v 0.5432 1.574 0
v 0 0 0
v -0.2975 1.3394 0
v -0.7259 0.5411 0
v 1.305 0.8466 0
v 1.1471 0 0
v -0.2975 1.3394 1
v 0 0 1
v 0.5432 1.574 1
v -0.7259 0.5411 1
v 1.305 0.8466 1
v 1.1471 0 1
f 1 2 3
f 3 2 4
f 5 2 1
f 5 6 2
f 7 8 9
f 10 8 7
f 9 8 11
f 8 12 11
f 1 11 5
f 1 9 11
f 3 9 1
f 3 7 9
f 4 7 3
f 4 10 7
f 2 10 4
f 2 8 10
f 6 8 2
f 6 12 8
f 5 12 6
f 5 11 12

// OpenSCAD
//  kit wallace random polygon
// number of sides 
n=6;
// average length of side
side=1;
// % randomness in length of side
length_random_pc=20;
// % randomness in interior angle
angle_random_pc=20;
// height of extrusion
height=1;
// tolerance to rounding errors
eps=0.0;

//  angles 

function angle_between(u, v) = 
     let (x= unitv(u) * unitv(v))
     let (y = x <= -1 ? -1 :x >= 1 ? 1 : x)
     let (a = acos(y))
     let (d = cross(u,v).z)
      d  > 0 ? a : 360- a;
               
// vector operations 
function zero(v) =
    len(v) == undef ? 0 : [for (i=[0:len(v)-1]) 0];
   
function slice(v,d,i=0) =
     i < len(v) ?  concat([v[i][d]], slice(v,d,i+1) ) : [] ;
   
function unitv(v)=  v/ norm(v);
   
function v_sum_r(v,n,k) =
      k < n ?  v[k] + v_sum_r(v,n,k+1) : zero(v[0]) ;

function v_sum(v) = v_sum_r(v,len(v),0);
  
function avg(v) =v_sum(v) / len(v);
    
function v_centre(v) =  avg(v);
  
function 3d_to_2d(points)=
    [ for (p=points) [p.x,p.y]];
        
function 2d_to_3d(points)=
    [ for (p=points) [p.x,p.y,0]];

//  perimeter operations   
//  perimeter is  defined as a sequence of length/interior angle pairs, going anticlockwise 

function peri_to_points(peri,pos=[0,0,0],dir=0,i=0) =
    i == len(peri)
      ? [pos]
      : let(side = peri[i])
        let (distance = side[0])
        let (newpos = pos + distance* [cos(dir), sin(dir),0])
        let (angle = side[1])
        let (newdir = dir + (180 - angle))
        concat([pos],peri_to_points(peri,newpos,newdir,i+1)) 
     ;  
        
function peri_to_tile(peri,last=false) = 
    let (p = peri_to_points(peri))  
    last 
       ? [for (i=[0:len(p)-1]) p[i]] 
       : [for (i=[0:len(p)-2]) p[i]]; 

function total_internal(peri) =
      v_sum(slice(peri,1));
       
function isPolygon(peri) =
       let (n = len(peri))
       abs(total_internal(peri) - (n - 2) * 180)<  0.01;
       
function isConvex(peri,i=0) =
   i < len(peri)
     ? peri[i][1] > 0  && peri[i][1] < 180  && peri[i][0] > 0 && isConvex(peri,i+1)
     : true;     
       
// tile operations
    
function tile_to_peri(points) =
    [for (i=[0:len(points)-1])
        let (a = angle_between(
          points[(i+1) % len(points)] - points[i],
          points[(i+2) % len(points)] -  points[(i+1) % len(points)]))
          
       [norm(points[(i+1) % len(points)] - points[i]),
       180-a
       ]
    ] ;
    
// tile to object    
module fill_tile(tile,color="red") {
    color(color)
       polygon(3d_to_2d(tile)); 
};

function random_peri(n,side,lp,ap) =
   let(rs = rands(-1,1,2*n))
   let(lr= side * lp/100 )
   let(angle = 180 - 360 /n)
   let(ar = angle * ap/100)
   let (p1 =
    [for (i=[0:n-2])
        [max(side + rs[i]*lr,0), 
         max(angle + rs[i+n]*ar,0)]
    ])
   let(p2 = tile_to_peri(peri_to_tile(p1,true)))  // close the polygon
   let(ln= p2[n-1][0])
   let(an= p2[n-1][1])
   let(an1= p2[n-2][1])
   isConvex(p2) &&
   isPolygon(p2) &&
       abs (ln - side) < lr + eps  
       && abs (an - angle) < ar + eps  
       && abs (an1 - angle) < ar + eps  
       ? p2
       : random_peri(n,side,lp,ap)
  ;

// main
     
peri = random_peri(n=n,side=side,lp=length_random_pc,ap=angle_random_pc);
echo(peri);
tile= peri_to_tile(peri);
linear_extrude(height=height) fill_tile(tile);
echo(tile);
